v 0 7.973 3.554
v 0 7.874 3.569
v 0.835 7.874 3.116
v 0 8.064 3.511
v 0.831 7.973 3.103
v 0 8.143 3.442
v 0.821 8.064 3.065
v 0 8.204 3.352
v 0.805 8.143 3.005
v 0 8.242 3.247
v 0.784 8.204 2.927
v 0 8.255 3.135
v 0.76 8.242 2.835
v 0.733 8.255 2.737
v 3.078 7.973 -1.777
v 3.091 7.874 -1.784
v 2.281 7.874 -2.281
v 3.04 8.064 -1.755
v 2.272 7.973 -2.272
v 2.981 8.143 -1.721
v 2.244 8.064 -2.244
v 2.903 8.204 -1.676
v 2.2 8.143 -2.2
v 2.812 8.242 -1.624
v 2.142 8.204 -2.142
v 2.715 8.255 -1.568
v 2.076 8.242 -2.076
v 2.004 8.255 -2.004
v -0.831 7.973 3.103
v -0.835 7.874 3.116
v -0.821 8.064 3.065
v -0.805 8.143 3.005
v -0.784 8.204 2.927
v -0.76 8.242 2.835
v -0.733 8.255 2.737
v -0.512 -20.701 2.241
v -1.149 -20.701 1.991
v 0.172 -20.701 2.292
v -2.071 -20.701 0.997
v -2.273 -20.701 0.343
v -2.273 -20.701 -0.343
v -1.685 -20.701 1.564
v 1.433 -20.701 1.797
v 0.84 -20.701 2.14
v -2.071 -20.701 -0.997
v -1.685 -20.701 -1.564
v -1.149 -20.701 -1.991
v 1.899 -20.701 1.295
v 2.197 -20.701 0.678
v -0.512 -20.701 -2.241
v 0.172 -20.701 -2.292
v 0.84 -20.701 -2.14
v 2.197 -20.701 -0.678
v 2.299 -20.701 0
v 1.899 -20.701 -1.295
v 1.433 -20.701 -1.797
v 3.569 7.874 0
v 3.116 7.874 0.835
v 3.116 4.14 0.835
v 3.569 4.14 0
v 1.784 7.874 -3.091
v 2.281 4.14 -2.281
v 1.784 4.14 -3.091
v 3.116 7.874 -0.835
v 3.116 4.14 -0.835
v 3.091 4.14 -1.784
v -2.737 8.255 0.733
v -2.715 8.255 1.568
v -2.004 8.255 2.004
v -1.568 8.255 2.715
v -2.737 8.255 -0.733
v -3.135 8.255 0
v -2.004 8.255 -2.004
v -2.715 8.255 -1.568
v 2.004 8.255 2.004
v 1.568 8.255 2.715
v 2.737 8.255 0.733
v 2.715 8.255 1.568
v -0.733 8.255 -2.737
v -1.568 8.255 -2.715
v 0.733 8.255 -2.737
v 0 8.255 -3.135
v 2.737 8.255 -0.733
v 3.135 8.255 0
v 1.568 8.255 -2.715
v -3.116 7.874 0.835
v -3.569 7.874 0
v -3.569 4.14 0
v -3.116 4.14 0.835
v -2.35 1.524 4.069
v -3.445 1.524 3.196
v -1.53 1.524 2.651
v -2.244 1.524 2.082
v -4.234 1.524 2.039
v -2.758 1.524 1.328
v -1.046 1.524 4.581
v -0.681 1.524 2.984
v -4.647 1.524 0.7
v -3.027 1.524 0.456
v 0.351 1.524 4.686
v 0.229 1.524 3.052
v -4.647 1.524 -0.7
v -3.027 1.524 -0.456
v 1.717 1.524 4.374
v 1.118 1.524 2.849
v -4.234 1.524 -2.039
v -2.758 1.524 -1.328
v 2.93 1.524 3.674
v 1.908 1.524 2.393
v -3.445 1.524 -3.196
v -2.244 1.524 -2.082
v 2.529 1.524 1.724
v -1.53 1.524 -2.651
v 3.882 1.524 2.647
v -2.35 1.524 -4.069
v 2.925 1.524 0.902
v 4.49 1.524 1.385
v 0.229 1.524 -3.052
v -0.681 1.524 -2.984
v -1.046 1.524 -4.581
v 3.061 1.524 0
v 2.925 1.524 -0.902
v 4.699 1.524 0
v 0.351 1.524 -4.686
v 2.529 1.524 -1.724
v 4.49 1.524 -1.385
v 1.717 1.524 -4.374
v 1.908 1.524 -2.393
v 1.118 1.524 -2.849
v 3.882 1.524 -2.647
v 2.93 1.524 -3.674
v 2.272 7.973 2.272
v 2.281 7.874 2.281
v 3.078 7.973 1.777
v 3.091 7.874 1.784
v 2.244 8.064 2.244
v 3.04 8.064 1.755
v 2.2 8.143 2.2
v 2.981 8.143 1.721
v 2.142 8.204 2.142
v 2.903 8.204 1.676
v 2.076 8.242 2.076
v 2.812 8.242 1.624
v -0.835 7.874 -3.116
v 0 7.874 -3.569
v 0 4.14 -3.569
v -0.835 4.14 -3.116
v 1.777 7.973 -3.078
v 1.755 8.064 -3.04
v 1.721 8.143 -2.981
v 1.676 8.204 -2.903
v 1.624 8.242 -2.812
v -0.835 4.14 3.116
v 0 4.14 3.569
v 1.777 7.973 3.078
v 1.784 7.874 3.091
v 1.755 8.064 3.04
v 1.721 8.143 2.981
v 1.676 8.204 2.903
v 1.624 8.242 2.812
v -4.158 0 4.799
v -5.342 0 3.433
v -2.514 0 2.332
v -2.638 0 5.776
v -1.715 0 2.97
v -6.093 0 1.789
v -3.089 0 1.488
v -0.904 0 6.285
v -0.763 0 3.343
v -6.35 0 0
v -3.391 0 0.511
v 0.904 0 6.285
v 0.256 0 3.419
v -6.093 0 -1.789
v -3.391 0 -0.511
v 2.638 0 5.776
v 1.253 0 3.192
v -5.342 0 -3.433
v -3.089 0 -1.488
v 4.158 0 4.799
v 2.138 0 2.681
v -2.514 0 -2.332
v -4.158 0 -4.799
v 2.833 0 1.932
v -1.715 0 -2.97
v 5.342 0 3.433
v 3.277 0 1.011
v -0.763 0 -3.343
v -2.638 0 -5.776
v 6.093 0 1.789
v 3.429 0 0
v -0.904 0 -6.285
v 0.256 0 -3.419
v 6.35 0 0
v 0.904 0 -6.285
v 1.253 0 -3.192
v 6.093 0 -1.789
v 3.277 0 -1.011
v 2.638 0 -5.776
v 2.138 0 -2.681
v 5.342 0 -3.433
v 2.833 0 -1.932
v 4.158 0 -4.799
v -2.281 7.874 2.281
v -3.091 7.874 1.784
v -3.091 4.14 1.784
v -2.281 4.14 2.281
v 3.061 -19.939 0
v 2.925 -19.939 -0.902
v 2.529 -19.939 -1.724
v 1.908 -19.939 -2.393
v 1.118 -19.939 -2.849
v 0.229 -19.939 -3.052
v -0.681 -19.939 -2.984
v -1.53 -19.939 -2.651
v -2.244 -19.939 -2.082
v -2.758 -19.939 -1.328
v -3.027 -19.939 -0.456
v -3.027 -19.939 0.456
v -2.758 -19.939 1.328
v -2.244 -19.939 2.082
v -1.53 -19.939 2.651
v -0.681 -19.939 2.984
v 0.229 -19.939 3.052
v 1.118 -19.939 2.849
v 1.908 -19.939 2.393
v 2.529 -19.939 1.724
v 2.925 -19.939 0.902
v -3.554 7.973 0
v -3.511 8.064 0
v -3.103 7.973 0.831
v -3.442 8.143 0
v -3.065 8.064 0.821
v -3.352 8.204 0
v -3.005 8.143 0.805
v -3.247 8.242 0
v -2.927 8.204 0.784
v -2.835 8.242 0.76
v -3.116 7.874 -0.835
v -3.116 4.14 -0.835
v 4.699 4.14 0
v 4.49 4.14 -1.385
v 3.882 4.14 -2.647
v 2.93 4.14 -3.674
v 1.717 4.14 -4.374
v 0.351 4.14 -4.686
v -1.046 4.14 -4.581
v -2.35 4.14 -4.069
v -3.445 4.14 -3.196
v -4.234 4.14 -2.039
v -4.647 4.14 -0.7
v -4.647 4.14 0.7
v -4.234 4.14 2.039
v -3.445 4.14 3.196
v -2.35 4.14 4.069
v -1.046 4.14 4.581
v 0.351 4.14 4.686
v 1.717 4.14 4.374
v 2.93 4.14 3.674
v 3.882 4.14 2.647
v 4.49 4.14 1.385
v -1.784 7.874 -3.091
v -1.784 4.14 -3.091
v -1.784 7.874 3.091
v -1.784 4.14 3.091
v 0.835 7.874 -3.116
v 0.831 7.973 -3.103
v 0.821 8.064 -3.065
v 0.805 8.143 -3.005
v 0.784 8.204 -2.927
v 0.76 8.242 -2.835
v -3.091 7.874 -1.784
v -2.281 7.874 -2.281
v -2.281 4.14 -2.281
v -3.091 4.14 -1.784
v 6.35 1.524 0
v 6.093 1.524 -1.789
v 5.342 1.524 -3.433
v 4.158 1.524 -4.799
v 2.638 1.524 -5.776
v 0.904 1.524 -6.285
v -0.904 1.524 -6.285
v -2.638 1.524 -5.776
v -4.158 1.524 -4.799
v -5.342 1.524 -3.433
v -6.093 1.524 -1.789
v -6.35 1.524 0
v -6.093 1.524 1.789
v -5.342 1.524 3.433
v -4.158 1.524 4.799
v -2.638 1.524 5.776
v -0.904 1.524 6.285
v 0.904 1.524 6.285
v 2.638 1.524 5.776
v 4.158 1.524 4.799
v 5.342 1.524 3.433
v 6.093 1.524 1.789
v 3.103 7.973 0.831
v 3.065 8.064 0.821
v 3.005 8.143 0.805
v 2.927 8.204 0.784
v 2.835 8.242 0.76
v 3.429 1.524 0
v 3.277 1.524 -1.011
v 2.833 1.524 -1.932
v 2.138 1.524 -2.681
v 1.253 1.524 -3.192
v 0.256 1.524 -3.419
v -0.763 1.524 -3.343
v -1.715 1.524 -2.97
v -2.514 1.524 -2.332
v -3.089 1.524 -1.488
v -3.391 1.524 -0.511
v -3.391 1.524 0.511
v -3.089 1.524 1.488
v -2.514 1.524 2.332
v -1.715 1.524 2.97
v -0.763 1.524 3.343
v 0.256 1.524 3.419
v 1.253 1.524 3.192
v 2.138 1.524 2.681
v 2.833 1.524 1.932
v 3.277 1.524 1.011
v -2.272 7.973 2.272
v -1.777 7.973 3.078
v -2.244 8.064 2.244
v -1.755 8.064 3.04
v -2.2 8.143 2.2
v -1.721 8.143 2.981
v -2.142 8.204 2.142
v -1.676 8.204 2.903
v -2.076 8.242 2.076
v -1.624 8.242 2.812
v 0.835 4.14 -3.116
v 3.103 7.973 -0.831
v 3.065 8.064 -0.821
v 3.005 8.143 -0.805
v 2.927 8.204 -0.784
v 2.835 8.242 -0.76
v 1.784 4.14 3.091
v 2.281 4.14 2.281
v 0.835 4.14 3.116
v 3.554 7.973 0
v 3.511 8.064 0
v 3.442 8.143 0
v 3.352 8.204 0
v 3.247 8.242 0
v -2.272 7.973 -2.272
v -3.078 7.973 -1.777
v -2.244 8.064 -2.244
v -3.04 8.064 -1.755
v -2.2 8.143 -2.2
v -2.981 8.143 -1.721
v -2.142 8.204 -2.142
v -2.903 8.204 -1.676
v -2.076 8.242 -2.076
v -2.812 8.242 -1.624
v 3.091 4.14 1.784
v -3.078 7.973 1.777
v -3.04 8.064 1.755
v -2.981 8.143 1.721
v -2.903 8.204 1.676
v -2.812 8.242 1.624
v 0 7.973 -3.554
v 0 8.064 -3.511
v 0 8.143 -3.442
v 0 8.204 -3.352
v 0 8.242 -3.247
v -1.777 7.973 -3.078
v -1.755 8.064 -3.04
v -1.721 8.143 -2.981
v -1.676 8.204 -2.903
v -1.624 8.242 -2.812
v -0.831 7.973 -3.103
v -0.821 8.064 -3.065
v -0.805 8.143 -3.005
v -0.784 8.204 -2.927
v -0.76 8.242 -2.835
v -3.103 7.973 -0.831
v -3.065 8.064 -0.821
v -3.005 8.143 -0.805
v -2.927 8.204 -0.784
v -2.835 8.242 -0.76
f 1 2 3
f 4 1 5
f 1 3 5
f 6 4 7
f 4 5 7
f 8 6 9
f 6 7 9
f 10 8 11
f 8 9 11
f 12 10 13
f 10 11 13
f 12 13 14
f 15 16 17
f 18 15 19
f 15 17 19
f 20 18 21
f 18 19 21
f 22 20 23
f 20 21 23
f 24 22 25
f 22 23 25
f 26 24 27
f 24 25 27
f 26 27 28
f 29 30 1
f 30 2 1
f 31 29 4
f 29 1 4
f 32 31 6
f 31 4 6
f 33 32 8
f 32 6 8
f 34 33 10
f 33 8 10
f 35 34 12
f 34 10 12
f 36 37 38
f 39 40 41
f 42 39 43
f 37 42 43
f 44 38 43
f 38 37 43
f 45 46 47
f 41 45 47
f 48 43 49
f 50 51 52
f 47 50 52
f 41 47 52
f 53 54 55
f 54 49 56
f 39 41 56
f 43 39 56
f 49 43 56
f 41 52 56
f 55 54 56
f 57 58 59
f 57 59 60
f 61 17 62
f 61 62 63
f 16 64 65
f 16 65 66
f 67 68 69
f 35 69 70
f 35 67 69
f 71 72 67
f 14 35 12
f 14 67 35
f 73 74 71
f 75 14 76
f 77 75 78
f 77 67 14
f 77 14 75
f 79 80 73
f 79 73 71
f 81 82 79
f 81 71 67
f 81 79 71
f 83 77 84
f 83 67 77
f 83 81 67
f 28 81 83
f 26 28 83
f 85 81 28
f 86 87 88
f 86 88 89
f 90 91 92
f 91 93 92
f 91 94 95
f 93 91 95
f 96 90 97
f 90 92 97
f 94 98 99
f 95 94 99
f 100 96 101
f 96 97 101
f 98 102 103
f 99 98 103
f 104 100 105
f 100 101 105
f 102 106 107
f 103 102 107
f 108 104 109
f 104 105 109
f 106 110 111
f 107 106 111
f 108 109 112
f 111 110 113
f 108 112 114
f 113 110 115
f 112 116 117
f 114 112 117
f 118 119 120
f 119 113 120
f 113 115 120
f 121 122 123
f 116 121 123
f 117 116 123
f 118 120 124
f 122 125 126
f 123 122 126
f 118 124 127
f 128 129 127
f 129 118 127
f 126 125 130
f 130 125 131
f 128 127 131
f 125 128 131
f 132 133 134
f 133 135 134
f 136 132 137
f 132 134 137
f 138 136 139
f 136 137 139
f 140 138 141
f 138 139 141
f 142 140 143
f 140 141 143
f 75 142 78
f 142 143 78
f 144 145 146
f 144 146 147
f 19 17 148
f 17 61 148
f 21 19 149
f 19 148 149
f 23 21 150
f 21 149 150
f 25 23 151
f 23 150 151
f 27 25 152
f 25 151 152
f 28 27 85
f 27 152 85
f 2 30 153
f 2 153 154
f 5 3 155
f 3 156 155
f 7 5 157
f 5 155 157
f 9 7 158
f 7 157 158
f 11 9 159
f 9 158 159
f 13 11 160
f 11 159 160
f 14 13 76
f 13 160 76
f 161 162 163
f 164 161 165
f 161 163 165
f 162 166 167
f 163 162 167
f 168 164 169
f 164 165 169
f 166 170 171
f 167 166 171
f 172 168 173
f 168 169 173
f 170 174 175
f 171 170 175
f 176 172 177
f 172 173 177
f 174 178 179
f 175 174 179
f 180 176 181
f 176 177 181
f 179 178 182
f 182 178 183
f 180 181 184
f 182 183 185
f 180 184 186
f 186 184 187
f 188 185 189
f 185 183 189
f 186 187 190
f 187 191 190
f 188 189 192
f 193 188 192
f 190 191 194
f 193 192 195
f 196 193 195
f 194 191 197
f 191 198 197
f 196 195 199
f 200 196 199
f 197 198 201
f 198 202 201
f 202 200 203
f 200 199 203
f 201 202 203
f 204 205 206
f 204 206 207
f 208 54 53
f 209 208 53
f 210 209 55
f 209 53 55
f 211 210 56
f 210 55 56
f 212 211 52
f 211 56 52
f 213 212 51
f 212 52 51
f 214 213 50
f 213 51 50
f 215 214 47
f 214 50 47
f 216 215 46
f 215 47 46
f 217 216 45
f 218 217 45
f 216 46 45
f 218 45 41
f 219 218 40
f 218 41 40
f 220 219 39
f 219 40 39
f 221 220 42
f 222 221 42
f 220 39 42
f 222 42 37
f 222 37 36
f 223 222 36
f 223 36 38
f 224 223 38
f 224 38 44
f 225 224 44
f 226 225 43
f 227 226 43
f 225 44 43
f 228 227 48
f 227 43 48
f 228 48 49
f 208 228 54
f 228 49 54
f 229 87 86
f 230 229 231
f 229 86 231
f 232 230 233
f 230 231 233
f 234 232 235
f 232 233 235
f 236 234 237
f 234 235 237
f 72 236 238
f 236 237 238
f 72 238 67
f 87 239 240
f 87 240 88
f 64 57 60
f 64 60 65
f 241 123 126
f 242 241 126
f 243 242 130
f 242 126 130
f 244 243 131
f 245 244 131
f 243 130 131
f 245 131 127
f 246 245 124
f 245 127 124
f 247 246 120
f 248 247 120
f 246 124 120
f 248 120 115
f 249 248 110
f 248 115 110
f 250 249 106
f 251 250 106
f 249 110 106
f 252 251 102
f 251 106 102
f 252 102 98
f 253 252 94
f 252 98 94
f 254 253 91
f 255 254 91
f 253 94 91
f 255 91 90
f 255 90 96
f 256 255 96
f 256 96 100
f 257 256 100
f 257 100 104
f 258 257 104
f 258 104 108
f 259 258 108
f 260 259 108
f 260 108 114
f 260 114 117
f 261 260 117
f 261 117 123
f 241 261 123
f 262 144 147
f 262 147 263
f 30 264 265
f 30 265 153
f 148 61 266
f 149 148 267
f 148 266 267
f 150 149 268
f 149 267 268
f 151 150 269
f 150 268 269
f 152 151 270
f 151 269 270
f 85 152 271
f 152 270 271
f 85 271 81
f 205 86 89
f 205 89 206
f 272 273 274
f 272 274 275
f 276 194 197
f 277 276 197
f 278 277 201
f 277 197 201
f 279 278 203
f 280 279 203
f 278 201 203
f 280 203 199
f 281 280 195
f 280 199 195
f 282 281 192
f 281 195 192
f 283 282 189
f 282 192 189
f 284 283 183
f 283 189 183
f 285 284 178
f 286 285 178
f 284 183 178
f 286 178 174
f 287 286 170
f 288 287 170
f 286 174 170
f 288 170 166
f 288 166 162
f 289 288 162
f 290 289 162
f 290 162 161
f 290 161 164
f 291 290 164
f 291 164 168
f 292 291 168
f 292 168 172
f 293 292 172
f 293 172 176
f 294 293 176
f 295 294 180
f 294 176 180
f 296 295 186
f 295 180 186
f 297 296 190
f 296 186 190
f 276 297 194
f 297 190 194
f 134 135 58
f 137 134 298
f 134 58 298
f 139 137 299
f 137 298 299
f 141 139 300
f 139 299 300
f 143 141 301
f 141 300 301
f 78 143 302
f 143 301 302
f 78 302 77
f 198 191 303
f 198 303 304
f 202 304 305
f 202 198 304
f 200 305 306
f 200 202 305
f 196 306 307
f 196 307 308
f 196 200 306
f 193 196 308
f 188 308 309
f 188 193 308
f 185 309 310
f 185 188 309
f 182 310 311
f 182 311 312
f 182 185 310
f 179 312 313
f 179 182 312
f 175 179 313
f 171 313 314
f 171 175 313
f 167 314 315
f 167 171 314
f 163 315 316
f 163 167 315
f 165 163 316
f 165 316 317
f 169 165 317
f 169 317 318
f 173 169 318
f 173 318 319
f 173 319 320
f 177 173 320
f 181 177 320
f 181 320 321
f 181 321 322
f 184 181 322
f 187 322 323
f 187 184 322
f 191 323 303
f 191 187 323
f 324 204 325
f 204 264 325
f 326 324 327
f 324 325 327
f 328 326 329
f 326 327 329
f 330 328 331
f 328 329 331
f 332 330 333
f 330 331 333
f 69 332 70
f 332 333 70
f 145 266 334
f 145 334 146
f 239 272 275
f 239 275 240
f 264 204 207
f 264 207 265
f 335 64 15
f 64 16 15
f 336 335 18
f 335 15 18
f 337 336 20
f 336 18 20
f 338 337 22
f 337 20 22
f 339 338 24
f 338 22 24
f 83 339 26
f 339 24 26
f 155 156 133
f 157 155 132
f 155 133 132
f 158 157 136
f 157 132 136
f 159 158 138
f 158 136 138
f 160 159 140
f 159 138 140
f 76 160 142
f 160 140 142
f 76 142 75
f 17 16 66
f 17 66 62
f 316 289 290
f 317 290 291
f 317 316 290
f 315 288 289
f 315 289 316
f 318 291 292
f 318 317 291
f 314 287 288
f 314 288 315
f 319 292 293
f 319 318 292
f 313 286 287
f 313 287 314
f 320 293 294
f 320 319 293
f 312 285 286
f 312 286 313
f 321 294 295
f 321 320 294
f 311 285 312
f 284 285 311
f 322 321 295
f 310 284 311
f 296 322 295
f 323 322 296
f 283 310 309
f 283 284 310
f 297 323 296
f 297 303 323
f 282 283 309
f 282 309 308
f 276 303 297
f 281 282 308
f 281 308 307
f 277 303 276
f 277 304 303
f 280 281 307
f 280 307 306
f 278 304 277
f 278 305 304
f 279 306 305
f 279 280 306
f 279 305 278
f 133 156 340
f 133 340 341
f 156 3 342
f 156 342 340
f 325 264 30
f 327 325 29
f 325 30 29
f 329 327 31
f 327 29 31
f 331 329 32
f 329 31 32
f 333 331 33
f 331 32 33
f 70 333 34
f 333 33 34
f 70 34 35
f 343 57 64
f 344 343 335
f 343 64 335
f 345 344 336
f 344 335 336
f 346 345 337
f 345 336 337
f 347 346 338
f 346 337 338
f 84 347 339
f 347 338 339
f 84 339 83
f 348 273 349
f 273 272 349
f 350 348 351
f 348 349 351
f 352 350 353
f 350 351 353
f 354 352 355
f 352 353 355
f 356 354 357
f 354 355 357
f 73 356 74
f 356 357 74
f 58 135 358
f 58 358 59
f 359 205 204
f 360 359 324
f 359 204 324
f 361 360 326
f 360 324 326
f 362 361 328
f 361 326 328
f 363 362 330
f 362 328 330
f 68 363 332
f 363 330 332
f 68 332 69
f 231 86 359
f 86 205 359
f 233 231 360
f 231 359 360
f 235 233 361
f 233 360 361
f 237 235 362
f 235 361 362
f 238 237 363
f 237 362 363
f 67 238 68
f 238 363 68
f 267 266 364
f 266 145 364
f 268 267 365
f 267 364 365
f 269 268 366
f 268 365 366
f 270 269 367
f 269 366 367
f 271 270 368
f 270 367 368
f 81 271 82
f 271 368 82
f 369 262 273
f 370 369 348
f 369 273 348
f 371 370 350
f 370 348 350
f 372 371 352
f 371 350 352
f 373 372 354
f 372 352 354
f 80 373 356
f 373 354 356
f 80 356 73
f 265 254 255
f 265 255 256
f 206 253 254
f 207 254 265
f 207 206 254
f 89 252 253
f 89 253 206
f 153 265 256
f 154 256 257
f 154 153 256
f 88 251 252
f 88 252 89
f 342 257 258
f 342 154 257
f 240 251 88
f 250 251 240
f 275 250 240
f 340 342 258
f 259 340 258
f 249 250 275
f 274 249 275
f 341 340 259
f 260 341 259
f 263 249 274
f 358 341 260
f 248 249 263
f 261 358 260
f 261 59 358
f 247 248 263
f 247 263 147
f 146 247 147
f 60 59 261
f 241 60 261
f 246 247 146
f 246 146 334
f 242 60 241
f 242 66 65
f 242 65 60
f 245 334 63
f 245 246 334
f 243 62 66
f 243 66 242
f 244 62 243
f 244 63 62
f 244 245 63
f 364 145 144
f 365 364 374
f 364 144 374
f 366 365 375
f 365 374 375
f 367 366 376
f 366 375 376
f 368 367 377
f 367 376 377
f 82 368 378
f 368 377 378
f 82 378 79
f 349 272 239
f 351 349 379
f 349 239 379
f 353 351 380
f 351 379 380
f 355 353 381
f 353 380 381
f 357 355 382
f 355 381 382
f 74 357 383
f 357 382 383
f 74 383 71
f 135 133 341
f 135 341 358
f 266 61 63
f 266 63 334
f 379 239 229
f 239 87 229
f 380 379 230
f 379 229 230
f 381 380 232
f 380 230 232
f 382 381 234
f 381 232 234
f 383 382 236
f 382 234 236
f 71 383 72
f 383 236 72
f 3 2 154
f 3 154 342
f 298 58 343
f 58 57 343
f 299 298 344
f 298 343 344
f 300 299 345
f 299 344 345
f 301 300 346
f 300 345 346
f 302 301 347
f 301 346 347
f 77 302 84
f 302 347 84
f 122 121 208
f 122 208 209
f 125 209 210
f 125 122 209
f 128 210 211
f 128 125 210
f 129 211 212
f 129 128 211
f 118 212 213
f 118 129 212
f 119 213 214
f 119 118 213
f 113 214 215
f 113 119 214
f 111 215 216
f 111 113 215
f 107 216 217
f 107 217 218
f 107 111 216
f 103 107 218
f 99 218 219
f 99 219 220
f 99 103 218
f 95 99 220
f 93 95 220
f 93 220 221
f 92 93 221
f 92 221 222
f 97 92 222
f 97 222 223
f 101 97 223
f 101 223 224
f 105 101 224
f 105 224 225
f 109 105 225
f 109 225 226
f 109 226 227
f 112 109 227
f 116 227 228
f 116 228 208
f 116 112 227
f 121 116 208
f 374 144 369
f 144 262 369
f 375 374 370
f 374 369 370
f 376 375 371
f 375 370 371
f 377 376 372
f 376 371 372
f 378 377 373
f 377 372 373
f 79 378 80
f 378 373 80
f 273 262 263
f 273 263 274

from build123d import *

# Parameters (mm, degrees)
SKETCH8_R           = 6.35
SKETCH8_R_2         = 3.429
WASHER_DEPTH        = 1.524
SKETCH9_R           = 3.0607
BOSS_EXTRUDE4_DEPTH = 22.225
SKETCH10_R          = 4.699
BOSS_EXTRUDE5_DEPTH = 6.731
SKETCH11_R          = 4.699
CUT_EXTRUDE2_DEPTH  = 4.1148
FILLET5_R           = 0.381
CHAMFER1_SIZE       = 0.762


with BuildPart() as part:
    # Sketch8 → Washer (new body)
    with BuildSketch(Plane(origin=(0, 0, 0), x_dir=(1, 0, 0), z_dir=(0, 1, 0))):
        Circle(SKETCH8_R)
        Circle(SKETCH8_R_2, mode=Mode.SUBTRACT)
    extrude(amount=WASHER_DEPTH)


with BuildPart() as body_2:
    # Sketch9 → Boss-Extrude4 (new body)
    with BuildSketch(Plane(origin=(0, 1.524, 0), x_dir=(1, 0, 0), z_dir=(0, 1, 0))):
        Circle(SKETCH9_R)
    extrude(amount=-BOSS_EXTRUDE4_DEPTH)


with BuildPart() as body_3:
    # Sketch10 → Boss-Extrude5 (new body)
    with BuildSketch(Plane(origin=(0, 1.524, 0), x_dir=(1, 0, 0), z_dir=(0, 1, 0))):
        Circle(SKETCH10_R)
    extrude(amount=BOSS_EXTRUDE5_DEPTH)

    # Sketch11 → Cut-Extrude2 (cut)
    with BuildSketch(Plane(origin=(0, 8.255, 0), x_dir=(1, 0, 0), z_dir=(0, 1, 0))):
        Circle(SKETCH11_R)
        Polygon((0, 3.5687), (-0.834898476, 3.11588353), (-1.78435, 3.090584858), (-2.280985055, 2.280985055), (-3.090584858, 1.78435), (-3.11588353, 0.834898476), (-3.5687, 0), (-3.11588353, -0.834898476), (-3.090584858, -1.78435), (-2.280985055, -2.280985055), (-1.78435, -3.090584858), (-0.834898476, -3.11588353), (0, -3.5687), (0.834898476, -3.11588353), (1.78435, -3.090584858), (2.280985055, -2.280985055), (3.090584858, -1.78435), (3.11588353, -0.834898476), (3.5687, 0), (3.11588353, 0.834898476), (3.090584858, 1.78435), (2.280985055, 2.280985055), (1.78435, 3.090584858), (0.834898476, 3.11588353), align=None, mode=Mode.SUBTRACT)
    extrude(amount=-CUT_EXTRUDE2_DEPTH, mode=Mode.SUBTRACT)


with BuildPart() as body_2_1:
    add(body_2.part)

    # Combine1: union body 3
    add(body_3.part)

    # Fillet5
    fillet5_edges = [body_2_1.edges().sort_by_distance(p)[0] for p in [
        (-0.417449238, 8.255, -3.342291765),
        (-1.309624238, 8.255, -3.103234194),
        (-2.032667527, 8.255, -2.685784957),
        (-2.685784957, 8.255, -2.032667527),
        (-3.103234194, 8.255, -1.309624238),
        (-3.342291765, 8.255, -0.417449238),
        (-3.342291765, 8.255, 0.417449238),
        (-3.103234194, 8.255, 1.309624238),
        (-2.685784957, 8.255, 2.032667527),
        (-2.032667527, 8.255, 2.685784957),
        (-1.309624238, 8.255, 3.103234194),
        (-0.417449238, 8.255, 3.342291765),
        (0.417449238, 8.255, 3.342291765),
        (1.309624238, 8.255, 3.103234194),
        (2.032667527, 8.255, 2.685784957),
        (2.685784957, 8.255, 2.032667527),
        (3.103234194, 8.255, 1.309624238),
        (3.342291765, 8.255, 0.417449238),
        (3.342291765, 8.255, -0.417449238),
        (3.103234194, 8.255, -1.309624238),
        (2.685784957, 8.255, -2.032667527),
        (2.032667527, 8.255, -2.685784957),
        (1.309624238, 8.255, -3.103234194),
        (0.417449238, 8.255, -3.342291765),
    ]]
    fillet(fillet5_edges, radius=FILLET5_R)

    # Chamfer1
    chamfer1_edges = [body_2_1.edges().sort_by_distance(p)[0] for p in [
        (-3.0607, -20.701, 0),
    ]]
    chamfer(chamfer1_edges, length=CHAMFER1_SIZE)


solid = Compound([part.part, body_2_1.part])
